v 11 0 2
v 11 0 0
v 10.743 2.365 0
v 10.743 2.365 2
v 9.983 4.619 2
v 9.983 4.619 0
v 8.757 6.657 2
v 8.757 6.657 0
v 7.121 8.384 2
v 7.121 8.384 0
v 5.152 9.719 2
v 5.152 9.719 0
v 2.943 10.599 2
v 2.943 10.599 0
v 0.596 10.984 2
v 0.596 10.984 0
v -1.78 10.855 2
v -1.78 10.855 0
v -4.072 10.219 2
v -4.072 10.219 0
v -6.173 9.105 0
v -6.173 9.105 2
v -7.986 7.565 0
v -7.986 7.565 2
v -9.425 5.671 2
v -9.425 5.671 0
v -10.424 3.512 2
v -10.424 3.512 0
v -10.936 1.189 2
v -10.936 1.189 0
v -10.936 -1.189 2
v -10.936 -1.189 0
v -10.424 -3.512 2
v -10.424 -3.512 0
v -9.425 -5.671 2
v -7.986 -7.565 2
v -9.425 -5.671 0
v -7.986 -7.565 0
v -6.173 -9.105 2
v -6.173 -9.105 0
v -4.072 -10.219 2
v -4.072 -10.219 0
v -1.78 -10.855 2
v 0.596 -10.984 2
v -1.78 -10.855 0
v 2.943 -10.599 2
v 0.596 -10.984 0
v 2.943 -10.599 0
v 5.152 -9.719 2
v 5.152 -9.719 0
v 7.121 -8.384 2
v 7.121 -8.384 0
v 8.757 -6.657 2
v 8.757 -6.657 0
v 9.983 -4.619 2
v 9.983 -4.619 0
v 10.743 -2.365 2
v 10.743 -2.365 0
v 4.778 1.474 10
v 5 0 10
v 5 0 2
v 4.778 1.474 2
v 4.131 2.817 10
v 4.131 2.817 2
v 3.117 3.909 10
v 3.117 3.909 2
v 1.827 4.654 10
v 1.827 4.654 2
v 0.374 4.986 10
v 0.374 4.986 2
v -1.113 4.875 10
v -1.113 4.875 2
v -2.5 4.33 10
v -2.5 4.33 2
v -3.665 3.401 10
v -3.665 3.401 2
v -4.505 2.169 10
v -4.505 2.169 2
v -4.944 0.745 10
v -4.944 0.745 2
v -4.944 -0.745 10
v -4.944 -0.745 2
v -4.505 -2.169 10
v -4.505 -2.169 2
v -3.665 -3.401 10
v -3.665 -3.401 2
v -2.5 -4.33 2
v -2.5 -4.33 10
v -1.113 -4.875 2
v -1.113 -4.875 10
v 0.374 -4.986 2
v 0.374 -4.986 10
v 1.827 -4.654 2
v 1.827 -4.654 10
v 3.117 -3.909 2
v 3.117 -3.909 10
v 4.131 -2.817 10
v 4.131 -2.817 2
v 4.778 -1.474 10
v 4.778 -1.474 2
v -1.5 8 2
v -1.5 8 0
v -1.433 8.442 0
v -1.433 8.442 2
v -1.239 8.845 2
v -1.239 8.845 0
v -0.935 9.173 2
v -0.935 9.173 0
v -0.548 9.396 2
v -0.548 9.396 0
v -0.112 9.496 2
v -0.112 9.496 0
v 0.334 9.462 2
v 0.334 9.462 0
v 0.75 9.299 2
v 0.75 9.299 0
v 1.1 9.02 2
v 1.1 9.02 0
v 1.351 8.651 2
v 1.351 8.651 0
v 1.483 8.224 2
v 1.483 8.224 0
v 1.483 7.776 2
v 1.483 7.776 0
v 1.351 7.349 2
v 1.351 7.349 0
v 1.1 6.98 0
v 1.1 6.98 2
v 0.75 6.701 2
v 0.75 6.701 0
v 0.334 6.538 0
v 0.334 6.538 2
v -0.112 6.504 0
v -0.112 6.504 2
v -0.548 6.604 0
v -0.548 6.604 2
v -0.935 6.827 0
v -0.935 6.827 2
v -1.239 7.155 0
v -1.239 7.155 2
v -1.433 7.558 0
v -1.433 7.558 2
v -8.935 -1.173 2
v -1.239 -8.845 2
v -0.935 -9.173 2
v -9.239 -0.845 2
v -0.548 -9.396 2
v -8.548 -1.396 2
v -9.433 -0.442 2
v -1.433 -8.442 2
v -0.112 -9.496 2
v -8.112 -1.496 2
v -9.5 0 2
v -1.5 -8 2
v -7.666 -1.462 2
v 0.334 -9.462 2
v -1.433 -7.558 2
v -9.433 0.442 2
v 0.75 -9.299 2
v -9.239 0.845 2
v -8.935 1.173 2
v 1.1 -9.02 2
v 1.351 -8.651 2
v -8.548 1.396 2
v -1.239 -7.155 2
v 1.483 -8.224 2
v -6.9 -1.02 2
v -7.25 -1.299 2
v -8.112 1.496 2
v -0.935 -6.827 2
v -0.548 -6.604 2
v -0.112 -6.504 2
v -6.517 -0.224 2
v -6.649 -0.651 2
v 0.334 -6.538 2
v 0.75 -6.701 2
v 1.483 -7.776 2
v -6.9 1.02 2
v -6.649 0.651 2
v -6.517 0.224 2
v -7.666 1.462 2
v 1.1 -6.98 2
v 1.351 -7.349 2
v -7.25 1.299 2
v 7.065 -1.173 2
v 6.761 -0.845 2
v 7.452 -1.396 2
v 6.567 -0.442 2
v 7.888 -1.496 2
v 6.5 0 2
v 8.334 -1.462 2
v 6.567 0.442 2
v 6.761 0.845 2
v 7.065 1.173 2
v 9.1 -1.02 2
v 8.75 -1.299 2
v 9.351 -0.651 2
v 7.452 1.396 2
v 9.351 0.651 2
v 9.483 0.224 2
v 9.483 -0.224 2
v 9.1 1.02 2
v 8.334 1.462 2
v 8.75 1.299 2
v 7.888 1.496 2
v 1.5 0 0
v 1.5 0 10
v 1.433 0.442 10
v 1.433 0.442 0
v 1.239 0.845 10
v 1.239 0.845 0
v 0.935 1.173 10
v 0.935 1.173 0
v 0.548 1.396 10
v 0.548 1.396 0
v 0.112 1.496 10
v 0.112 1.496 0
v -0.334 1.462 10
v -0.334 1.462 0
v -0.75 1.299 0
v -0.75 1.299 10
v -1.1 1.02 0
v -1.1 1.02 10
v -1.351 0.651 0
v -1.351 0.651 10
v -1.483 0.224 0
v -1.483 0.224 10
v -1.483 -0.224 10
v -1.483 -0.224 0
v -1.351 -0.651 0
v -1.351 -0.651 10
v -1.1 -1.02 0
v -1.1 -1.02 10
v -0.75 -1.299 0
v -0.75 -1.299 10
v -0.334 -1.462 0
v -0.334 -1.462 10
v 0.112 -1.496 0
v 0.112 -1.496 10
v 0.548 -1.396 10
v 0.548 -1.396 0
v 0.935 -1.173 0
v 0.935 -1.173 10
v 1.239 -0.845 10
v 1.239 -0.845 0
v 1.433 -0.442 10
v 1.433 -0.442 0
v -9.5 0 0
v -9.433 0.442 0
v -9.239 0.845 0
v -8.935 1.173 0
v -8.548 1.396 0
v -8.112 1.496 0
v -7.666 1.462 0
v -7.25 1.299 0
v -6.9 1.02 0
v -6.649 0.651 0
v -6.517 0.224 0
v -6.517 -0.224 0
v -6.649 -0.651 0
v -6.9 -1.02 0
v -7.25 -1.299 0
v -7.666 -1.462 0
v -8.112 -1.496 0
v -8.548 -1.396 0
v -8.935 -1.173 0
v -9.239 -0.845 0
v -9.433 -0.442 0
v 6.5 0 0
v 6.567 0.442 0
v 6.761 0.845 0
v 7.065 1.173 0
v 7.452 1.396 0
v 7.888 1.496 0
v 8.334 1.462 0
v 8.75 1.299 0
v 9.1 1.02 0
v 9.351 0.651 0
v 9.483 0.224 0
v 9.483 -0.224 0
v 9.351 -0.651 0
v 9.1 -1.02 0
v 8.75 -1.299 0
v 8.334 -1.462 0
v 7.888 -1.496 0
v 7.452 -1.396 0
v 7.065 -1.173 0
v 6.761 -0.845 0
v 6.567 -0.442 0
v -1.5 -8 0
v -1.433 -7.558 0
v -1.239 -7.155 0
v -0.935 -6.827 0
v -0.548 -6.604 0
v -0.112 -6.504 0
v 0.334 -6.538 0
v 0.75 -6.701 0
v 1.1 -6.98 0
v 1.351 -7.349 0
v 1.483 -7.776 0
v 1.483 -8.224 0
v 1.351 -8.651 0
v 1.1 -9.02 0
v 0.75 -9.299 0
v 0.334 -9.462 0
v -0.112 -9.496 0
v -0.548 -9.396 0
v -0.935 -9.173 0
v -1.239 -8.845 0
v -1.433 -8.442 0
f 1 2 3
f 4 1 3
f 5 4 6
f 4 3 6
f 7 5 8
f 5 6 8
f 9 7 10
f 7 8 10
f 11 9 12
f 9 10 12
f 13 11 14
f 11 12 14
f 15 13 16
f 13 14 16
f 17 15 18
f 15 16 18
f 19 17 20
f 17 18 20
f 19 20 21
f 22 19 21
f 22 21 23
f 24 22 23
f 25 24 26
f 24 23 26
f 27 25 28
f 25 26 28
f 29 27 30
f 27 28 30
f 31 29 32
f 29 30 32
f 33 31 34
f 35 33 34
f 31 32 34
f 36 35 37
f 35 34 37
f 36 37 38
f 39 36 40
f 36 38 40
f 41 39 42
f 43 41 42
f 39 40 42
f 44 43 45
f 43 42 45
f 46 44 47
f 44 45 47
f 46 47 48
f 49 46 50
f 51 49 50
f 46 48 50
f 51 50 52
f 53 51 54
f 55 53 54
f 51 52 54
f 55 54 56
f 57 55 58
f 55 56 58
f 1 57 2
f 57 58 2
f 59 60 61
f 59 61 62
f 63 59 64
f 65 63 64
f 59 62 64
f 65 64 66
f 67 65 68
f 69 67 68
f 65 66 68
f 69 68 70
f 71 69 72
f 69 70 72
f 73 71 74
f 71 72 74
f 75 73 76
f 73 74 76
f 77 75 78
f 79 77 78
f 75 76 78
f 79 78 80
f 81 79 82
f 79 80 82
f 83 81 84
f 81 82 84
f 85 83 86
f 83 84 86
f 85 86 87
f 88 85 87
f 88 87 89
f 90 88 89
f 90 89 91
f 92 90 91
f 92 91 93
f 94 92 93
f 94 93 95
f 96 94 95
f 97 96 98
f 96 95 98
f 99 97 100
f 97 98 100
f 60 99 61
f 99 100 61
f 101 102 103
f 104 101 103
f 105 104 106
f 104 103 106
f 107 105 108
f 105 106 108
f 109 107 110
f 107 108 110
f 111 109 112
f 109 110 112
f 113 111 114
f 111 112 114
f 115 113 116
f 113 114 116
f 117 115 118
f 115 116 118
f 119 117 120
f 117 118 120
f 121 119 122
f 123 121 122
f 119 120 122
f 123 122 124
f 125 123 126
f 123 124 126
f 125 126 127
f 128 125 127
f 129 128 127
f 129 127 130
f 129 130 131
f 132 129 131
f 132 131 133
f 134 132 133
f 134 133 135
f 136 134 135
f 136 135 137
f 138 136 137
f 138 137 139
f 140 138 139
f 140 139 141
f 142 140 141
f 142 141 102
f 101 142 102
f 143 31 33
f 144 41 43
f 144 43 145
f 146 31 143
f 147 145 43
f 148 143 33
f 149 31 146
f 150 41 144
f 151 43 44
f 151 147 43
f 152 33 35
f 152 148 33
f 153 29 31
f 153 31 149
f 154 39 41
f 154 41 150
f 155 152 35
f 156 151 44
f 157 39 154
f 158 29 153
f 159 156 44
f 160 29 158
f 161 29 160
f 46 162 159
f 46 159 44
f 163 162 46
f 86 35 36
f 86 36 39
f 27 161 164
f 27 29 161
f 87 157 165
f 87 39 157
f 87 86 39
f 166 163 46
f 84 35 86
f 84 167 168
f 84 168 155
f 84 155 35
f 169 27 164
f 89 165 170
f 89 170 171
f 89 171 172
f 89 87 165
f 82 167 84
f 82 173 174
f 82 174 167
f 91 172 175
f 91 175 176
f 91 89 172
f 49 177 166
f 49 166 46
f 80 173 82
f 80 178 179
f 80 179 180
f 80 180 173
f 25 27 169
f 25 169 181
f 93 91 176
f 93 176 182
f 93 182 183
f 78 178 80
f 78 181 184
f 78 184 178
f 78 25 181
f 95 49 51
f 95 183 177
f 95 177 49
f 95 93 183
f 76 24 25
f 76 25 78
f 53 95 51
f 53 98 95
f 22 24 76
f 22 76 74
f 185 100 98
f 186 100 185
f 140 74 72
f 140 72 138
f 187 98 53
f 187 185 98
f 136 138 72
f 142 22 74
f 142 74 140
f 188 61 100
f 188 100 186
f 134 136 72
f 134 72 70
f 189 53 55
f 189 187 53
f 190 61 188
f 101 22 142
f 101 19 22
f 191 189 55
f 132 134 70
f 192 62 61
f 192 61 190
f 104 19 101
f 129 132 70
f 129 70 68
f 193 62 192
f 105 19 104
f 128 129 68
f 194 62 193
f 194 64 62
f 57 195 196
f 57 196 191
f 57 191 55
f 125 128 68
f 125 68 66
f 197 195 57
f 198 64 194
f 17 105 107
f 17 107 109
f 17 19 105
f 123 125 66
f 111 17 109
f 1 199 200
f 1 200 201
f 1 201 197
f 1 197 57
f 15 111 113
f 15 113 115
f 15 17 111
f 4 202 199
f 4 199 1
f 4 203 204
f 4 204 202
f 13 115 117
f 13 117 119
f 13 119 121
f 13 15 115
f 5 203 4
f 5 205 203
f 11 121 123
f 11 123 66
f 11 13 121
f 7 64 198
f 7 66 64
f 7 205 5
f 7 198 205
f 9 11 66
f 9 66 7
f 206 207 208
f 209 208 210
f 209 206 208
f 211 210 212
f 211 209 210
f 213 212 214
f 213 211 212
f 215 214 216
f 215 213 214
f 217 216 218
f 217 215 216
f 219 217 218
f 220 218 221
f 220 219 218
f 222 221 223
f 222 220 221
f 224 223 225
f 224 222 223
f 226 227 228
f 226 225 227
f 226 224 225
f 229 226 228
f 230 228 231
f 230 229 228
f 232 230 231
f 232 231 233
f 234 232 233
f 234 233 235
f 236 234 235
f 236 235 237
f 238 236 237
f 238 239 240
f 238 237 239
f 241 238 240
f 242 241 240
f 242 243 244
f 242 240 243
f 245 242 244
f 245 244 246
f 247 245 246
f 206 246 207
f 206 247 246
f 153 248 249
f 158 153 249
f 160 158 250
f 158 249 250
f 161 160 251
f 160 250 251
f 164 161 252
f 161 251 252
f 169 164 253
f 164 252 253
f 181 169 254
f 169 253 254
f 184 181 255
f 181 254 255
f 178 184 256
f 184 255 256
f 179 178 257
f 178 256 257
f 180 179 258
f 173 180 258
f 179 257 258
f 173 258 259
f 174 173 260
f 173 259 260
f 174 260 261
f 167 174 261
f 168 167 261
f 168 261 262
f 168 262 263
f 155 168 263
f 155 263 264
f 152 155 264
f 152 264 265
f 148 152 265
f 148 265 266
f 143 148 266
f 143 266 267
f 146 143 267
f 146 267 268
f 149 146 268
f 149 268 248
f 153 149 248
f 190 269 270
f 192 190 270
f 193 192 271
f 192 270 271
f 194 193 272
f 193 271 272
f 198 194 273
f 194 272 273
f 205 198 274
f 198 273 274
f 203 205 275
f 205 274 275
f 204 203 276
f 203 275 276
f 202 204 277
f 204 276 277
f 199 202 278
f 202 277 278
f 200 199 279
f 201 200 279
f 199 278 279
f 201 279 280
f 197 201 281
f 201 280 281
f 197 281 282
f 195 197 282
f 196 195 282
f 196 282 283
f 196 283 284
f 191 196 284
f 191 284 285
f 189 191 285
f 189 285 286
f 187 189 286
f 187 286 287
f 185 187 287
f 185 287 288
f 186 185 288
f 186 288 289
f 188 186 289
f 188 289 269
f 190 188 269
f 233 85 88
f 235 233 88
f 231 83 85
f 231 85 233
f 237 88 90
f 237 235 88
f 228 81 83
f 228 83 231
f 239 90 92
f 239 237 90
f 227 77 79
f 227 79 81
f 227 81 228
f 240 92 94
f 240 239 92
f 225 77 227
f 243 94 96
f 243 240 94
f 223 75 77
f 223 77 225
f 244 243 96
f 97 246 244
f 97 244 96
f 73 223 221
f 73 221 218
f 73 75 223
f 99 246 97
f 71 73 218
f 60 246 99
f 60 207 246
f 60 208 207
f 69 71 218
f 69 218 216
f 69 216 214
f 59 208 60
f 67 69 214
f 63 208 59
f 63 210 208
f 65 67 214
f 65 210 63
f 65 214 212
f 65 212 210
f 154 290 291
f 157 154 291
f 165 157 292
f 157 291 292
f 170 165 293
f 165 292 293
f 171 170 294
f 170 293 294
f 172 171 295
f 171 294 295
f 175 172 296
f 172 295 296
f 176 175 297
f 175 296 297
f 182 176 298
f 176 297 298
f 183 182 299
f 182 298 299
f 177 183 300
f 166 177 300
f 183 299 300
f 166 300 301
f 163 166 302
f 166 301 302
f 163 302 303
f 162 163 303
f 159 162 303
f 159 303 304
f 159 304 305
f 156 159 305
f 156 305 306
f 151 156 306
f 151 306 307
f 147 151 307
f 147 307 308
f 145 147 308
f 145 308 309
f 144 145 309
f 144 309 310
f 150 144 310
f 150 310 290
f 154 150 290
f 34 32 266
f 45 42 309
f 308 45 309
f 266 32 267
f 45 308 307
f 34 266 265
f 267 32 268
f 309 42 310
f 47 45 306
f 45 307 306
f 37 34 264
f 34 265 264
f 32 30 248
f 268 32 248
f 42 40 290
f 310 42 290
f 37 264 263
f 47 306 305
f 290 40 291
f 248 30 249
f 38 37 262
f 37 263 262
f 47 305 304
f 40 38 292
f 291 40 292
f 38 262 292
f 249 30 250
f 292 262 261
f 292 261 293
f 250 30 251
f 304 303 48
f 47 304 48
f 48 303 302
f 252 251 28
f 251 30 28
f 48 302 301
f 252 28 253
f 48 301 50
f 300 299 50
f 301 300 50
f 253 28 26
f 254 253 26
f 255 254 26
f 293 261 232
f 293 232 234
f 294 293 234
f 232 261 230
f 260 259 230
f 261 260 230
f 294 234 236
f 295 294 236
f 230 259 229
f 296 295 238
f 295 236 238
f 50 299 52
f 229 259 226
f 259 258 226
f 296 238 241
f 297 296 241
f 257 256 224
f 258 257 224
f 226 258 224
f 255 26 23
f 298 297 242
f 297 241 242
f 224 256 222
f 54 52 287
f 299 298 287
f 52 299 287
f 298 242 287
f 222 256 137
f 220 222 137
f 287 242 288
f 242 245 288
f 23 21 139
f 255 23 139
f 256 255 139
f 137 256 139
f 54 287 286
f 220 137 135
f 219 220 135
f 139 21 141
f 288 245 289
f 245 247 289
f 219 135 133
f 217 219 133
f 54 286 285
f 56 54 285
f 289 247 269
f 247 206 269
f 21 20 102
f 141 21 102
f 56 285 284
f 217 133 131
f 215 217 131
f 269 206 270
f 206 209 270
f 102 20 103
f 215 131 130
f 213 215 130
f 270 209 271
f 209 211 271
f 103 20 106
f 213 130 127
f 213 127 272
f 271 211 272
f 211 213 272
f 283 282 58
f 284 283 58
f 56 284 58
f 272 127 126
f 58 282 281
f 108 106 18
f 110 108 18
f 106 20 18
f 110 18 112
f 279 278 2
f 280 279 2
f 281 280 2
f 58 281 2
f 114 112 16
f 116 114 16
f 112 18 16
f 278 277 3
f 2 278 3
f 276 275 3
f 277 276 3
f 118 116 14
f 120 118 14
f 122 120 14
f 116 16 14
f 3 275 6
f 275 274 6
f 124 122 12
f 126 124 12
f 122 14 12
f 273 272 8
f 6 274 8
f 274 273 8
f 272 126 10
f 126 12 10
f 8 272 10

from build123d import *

# Parameters (mm, degrees)
SKETCH1_R      = 11
EXTRUDE1_DEPTH = 2
SKETCH2_R      = 5
EXTRUDE2_DEPTH = 8
SKETCH3_R      = 1.5
EXTRUDE5_DEPTH = 19.493242009
SKETCH4_R      = 1.5
EXTRUDE6_DEPTH = 8


with BuildPart() as part:
    # Sketch1 → Extrude1 (new body)
    with BuildSketch(Plane.XY):
        Circle(SKETCH1_R)
    extrude(amount=EXTRUDE1_DEPTH)

    # Sketch2 → Extrude2 (add)
    with BuildSketch(Plane.XY.offset(2)):
        Circle(SKETCH2_R)
    extrude(amount=EXTRUDE2_DEPTH)

    # Sketch3 → Extrude5 (cut, through all)
    with BuildSketch(Plane.XY):
        Circle(SKETCH3_R)
    extrude(amount=EXTRUDE5_DEPTH, mode=Mode.SUBTRACT)

    # Sketch4 → Extrude6 (cut)
    with BuildSketch(Plane(origin=(0, 0, 0), x_dir=(-1, 0, 0), z_dir=(0, 0, -1))):
        with Locations((8, 0)):
            Circle(SKETCH4_R)
        with Locations((0, -8)):
            Circle(SKETCH4_R)
        with Locations((-8, 0)):
            Circle(SKETCH4_R)
        with Locations((0, 8)):
            Circle(SKETCH4_R)
    extrude(amount=-EXTRUDE6_DEPTH, mode=Mode.SUBTRACT)


solid = part.part
